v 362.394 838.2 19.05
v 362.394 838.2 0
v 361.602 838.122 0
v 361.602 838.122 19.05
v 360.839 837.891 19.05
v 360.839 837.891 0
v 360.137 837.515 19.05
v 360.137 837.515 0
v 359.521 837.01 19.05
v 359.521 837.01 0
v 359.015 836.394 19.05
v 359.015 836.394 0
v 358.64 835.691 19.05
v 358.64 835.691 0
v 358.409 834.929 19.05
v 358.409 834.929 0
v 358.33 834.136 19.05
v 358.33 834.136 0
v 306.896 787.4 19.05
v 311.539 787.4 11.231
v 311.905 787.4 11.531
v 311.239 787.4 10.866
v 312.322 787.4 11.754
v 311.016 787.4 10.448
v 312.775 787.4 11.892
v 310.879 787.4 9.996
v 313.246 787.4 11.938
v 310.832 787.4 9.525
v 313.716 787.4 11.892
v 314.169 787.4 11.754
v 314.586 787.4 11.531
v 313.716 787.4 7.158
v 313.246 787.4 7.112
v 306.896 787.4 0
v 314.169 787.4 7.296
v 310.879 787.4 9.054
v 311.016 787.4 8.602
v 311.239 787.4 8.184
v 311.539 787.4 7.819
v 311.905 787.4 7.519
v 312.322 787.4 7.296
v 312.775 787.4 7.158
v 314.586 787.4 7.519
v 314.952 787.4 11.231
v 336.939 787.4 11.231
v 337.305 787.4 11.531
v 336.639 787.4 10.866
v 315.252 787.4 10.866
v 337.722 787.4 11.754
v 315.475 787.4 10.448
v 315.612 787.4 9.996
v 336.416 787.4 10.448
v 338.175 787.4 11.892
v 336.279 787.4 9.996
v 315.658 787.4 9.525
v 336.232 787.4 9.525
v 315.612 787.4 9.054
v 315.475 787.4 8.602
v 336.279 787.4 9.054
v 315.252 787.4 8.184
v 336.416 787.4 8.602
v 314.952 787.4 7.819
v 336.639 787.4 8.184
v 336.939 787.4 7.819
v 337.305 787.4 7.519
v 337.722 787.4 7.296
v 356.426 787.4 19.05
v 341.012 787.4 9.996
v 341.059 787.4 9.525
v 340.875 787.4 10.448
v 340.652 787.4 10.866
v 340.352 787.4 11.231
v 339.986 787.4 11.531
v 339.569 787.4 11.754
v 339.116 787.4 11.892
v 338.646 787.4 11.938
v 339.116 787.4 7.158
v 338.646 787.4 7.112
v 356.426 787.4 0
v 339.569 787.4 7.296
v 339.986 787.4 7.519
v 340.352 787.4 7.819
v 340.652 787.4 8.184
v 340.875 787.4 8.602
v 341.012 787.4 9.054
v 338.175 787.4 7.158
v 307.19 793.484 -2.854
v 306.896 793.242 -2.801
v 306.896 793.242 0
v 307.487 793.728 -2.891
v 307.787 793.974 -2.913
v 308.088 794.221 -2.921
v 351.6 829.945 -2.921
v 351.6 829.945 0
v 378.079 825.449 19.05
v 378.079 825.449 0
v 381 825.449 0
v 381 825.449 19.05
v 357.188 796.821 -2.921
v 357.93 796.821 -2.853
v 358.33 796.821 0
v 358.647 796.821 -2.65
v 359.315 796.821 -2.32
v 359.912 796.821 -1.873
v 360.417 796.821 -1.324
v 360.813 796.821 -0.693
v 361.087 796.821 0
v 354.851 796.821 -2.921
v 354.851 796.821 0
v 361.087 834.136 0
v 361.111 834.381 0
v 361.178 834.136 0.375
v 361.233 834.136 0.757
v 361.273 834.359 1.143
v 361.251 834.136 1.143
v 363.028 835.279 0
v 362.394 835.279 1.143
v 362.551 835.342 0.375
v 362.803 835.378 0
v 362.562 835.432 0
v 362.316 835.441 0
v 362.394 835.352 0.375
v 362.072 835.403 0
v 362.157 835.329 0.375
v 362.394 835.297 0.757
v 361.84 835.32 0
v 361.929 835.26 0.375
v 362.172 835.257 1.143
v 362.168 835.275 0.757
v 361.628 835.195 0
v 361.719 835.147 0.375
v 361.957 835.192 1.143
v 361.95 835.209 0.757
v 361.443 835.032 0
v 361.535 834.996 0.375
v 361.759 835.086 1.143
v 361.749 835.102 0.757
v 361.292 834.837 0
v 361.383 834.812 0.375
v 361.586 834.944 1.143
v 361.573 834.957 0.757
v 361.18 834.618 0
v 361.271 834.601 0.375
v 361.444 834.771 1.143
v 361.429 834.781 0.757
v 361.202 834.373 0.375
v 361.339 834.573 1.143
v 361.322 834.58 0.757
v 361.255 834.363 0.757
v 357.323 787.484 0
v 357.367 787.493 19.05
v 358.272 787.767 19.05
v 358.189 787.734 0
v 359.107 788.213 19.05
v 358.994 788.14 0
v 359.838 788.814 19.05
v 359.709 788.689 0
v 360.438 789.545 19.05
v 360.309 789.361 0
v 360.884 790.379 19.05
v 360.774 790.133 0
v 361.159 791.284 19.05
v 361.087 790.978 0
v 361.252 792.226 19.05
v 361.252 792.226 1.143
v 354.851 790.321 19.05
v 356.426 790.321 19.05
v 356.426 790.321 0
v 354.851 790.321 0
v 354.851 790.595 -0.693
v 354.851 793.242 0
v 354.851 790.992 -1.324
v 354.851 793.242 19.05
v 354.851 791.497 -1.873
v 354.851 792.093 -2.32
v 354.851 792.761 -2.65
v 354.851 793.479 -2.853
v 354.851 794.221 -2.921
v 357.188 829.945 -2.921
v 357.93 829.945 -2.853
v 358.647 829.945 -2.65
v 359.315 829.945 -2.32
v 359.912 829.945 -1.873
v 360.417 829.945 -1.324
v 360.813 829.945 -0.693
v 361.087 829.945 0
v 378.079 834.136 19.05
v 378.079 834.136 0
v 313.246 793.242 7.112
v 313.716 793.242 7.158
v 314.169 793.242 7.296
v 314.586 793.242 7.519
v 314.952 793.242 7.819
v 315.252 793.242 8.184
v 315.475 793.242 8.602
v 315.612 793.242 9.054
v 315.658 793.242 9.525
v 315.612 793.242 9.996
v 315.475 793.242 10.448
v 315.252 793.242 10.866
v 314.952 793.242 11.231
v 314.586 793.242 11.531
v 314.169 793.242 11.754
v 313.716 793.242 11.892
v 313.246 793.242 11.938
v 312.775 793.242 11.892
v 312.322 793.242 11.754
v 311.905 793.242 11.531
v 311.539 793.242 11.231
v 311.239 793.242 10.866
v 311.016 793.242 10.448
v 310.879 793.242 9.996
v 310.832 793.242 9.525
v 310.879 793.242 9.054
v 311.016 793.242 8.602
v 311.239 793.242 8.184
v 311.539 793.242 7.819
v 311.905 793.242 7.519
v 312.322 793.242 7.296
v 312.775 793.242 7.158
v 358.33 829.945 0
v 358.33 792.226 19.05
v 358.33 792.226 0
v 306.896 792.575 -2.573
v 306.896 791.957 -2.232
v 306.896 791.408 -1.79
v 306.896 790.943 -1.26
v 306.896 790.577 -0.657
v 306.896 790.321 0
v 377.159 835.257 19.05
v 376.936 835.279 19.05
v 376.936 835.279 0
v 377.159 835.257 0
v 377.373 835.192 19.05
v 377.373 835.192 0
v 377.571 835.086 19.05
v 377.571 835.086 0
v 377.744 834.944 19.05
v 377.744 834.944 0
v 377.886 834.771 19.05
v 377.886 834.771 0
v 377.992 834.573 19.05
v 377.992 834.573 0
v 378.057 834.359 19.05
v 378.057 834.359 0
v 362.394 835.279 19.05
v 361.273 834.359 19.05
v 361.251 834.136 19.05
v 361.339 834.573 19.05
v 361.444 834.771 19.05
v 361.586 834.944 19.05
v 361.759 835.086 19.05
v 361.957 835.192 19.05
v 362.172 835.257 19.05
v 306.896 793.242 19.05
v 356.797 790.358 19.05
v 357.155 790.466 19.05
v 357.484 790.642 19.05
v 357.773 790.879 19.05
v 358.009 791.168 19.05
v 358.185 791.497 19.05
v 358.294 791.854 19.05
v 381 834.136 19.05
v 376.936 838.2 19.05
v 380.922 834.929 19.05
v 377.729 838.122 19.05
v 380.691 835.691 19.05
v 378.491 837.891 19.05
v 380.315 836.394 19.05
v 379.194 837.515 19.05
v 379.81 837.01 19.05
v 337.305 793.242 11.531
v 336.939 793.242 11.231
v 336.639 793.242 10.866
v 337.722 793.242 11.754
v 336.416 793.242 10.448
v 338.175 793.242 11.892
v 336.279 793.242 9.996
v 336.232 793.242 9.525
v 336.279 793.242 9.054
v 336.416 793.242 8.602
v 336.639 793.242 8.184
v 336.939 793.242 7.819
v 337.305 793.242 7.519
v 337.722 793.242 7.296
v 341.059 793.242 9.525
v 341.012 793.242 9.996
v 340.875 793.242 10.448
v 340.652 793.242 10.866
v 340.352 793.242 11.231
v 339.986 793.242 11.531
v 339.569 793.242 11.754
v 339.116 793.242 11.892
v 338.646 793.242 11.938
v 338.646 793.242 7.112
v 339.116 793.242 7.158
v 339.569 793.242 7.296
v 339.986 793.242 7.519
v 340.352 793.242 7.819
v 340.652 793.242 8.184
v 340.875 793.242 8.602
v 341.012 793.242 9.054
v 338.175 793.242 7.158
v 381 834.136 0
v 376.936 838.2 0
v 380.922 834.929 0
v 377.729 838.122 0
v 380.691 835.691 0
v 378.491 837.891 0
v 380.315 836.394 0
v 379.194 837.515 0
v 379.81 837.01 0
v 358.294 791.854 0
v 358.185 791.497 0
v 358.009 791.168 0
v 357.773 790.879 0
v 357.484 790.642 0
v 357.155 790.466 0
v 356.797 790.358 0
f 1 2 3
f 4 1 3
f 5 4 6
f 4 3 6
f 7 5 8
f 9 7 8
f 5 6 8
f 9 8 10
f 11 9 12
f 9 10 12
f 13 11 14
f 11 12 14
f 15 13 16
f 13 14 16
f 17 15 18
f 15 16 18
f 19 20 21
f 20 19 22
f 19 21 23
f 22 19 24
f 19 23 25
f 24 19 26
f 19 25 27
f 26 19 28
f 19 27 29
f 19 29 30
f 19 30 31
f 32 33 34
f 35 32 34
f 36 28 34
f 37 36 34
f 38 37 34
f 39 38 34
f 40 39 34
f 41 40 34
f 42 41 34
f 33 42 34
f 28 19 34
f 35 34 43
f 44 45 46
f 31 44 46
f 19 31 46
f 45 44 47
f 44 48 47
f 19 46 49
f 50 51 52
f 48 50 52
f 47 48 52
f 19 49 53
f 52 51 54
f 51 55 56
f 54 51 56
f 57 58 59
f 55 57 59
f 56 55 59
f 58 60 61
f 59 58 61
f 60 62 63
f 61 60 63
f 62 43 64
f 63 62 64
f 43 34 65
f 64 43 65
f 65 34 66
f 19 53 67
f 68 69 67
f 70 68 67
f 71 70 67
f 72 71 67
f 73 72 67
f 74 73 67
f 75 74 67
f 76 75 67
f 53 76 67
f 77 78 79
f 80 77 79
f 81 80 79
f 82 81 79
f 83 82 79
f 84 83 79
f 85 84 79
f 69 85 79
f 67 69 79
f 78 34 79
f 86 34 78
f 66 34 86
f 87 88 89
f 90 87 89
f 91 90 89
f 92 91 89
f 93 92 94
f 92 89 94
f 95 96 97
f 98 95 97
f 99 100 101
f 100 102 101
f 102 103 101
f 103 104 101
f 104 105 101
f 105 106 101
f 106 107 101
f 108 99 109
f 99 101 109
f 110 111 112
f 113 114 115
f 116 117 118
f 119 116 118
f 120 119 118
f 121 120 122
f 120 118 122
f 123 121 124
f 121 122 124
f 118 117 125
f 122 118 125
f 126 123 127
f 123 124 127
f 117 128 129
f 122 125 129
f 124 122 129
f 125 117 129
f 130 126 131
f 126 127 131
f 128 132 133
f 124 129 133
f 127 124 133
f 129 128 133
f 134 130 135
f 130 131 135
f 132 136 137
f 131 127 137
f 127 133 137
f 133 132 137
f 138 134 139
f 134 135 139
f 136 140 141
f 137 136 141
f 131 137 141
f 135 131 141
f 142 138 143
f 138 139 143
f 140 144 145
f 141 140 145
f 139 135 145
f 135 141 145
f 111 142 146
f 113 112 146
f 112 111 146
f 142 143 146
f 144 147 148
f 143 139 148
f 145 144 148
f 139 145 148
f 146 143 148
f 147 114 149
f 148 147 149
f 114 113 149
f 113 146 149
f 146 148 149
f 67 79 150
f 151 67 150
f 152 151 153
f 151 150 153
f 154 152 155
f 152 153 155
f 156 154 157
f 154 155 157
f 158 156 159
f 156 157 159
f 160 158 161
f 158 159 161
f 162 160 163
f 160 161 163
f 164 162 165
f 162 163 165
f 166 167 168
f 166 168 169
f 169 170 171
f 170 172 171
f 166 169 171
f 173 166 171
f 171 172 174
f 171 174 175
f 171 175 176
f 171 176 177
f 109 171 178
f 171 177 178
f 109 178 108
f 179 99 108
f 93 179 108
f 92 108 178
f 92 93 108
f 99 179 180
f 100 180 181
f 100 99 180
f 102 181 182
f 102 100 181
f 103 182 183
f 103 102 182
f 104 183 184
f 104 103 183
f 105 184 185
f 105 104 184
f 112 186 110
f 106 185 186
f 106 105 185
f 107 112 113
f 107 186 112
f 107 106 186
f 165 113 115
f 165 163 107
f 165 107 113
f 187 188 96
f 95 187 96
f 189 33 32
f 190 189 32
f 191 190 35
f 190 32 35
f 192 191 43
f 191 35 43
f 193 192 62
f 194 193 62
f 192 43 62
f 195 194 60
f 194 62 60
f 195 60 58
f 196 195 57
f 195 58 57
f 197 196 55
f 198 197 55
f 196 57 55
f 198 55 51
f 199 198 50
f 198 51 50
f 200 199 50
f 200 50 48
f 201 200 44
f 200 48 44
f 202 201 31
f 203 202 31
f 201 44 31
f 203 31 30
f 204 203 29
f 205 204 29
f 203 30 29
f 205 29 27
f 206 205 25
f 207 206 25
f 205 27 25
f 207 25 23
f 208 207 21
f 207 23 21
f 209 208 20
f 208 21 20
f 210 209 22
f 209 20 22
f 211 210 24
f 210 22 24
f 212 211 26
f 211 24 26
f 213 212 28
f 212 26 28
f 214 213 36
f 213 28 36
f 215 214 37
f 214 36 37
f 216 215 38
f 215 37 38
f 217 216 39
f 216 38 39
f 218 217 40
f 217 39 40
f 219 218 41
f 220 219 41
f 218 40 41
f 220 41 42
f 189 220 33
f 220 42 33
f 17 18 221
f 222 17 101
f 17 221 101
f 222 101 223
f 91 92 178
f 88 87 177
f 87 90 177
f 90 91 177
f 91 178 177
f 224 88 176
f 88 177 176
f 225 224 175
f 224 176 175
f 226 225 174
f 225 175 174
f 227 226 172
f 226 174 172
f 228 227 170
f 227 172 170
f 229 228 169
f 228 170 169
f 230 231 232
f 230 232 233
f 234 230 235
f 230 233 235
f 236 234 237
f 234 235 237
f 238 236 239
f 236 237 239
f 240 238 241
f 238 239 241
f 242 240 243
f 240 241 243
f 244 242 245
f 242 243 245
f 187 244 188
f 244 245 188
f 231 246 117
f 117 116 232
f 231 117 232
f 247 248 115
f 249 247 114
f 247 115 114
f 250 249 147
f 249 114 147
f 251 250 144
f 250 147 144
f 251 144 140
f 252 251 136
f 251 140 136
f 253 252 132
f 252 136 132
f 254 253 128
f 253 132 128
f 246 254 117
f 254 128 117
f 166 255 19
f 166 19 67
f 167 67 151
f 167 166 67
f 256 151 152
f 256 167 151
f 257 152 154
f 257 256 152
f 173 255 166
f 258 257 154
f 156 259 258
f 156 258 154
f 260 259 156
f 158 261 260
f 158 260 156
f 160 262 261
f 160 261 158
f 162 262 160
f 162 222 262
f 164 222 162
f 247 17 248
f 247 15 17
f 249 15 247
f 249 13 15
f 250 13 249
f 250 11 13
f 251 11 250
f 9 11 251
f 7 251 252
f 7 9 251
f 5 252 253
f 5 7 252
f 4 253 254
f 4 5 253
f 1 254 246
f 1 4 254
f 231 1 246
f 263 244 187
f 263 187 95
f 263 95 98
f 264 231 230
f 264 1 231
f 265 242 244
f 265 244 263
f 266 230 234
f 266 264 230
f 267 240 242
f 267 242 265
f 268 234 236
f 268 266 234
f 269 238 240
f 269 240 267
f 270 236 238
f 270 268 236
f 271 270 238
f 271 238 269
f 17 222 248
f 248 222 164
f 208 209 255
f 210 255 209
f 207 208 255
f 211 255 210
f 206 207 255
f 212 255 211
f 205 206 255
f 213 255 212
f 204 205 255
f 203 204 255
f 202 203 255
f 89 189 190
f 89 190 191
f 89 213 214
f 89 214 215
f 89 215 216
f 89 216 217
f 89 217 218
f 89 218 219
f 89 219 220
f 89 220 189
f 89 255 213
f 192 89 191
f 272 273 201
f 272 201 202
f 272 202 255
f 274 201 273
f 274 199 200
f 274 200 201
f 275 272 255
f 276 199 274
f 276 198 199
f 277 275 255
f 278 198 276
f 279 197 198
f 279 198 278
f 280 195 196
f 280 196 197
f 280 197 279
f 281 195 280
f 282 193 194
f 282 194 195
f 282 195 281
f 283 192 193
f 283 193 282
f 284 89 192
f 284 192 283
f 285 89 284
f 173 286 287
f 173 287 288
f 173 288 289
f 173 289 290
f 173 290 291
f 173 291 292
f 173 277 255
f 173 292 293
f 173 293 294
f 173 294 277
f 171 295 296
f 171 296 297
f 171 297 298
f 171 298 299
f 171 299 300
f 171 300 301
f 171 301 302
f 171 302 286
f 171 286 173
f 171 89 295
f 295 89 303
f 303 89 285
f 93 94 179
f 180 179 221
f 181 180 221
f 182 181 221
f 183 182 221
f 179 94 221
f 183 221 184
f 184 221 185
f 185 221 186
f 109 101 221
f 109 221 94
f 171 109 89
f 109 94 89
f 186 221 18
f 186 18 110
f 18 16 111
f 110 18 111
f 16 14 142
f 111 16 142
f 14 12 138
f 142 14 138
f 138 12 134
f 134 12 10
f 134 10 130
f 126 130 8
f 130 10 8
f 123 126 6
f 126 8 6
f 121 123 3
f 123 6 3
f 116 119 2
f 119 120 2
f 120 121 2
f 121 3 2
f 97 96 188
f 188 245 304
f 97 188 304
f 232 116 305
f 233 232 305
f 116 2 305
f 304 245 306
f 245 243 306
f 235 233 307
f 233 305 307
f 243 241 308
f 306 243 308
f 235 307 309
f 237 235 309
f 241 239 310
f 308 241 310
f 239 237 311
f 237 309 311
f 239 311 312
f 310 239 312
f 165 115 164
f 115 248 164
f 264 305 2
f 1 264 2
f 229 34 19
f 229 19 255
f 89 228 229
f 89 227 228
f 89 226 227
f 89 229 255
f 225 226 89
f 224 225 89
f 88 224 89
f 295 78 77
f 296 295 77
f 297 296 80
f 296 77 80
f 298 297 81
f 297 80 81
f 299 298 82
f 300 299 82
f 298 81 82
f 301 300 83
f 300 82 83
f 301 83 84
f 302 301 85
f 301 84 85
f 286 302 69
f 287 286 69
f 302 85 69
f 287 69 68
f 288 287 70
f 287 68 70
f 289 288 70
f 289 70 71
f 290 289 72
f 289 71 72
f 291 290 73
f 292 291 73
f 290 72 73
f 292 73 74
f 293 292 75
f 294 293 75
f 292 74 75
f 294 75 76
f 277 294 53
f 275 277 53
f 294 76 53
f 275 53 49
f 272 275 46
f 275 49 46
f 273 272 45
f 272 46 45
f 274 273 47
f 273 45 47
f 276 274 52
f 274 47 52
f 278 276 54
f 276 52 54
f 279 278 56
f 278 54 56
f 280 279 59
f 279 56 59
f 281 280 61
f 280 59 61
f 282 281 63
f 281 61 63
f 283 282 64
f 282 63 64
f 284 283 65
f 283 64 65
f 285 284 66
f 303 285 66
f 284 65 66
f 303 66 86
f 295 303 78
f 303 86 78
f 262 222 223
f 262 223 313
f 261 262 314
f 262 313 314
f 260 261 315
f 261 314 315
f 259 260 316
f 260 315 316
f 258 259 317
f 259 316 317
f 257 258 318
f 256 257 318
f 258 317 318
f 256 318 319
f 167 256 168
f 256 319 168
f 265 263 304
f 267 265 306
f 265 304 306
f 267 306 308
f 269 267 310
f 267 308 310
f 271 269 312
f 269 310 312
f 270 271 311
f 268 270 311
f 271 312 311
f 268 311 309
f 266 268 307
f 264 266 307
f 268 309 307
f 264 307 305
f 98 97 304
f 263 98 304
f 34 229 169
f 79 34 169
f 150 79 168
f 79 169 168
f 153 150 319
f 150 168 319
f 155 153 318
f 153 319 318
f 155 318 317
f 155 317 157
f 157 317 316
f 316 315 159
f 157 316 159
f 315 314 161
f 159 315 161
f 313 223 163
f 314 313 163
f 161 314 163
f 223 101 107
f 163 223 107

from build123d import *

# Parameters (mm, degrees)
EXTRUDE1_DEPTH     = 19.05
EXTRUDE4_DEPTH     = 2.921
SKETCH5_W          = 47.9552
SKETCH5_H          = 2.921
EXTRUDE5_DEPTH     = 19.05
FILLET1_R          = 4.064
FILLET2_START      = 790
FILLET2_2_DEPTH    = 44.1360001
SKETCH6_R          = 2.413
CUT_EXTRUDE1_DEPTH = 5.842


with BuildPart() as part:
    # Sketch2 → Extrude1 (new body)
    with BuildSketch(Plane.XY):
        with BuildLine():
            Line((356.4255, 790.321), (306.8955, 790.321))
            Line((306.8955, 790.321), (306.8955, 787.4))
            Line((306.8955, 787.4), (356.4255, 787.4))
            ThreePointArc((356.4255, 787.4), (359.837997326, 788.813502674), (361.2515, 792.226))
            Line((361.2515, 792.226), (361.2515, 834.136))
            ThreePointArc((361.2515, 834.136), (361.586276949, 834.944223051), (362.3945, 835.279))
            Line((362.3945, 835.279), (376.936, 835.279))
            ThreePointArc((376.936, 835.279), (377.744223051, 834.944223051), (378.079, 834.136))
            Line((378.079, 834.136), (378.079, 825.4492))
            Line((378.079, 825.4492), (381, 825.4492))
            Line((381, 825.4492), (381, 834.136))
            ThreePointArc((381, 834.136), (379.809681959, 837.009681959), (376.936, 838.2))
            Line((376.936, 838.2), (362.3945, 838.2))
            ThreePointArc((362.3945, 838.2), (359.520818041, 837.009681959), (358.3305, 834.136))
            Line((358.3305, 834.136), (358.3305, 792.226))
            ThreePointArc((358.3305, 792.226), (357.772538418, 790.878961582), (356.4255, 790.321))
        make_face()
    extrude(amount=EXTRUDE1_DEPTH)



with BuildPart() as body_2:
    # Sketch3 → Extrude4 (new body)
    with BuildSketch(Plane.XY):
        Polygon((306.8955, 793.242), (351.5995, 829.945), (361.2515, 829.945), (361.2515, 796.82051965), (354.8507, 796.82051965), (354.8507, 790.321), (306.8955, 790.321), align=None)
    extrude(amount=-EXTRUDE4_DEPTH)


with BuildPart() as part_1:
    add(part.part)

    add(body_2.part)  # Extrude5 merges body 2
    # Sketch5 → Extrude5 (add)
    with BuildSketch(Plane.XY):
        with Locations((330.8731, 791.7815)):
            Rectangle(SKETCH5_W, SKETCH5_H)
    extrude(amount=EXTRUDE5_DEPTH)

    # Fillet1
    # the kernel refuses this fillet: 4.064 mm, written as the material it takes off along each edge
    with BuildSketch(Plane(origin=(364.600586858, 790.321, -2.921), x_dir=(0, 0, 1), z_dir=(-1, 0, 0))) as fillet1_piece_1:
        with BuildLine():
            CenterArc((4.064, 3.899954743), FILLET1_R, 180, 73.665177219)
            Line((0, 3.899954743), (-0.08128, 3.899954743))
            Line((-0.08128, 3.899954743), (-0.08128, 0))
            Line((-0.08128, 0), (0, -0.08128))
            ThreePointArc((0, -0.08128), (1.4605, -0.08128), (2.89814, -0.077999095))
            Line((2.89814, -0.077999095), (2.921, 0))
        make_face()
    extrude(amount=67.454973717, mode=Mode.SUBTRACT)

    # Fillet2: read off the stored shape, not the designer's step
    # Fillet2 outline → Fillet2 (revolve, cut)
    with BuildSketch(Plane(origin=(362.3945, 834.136, 0), x_dir=(1, 0, 0), z_dir=(0, -1, 0))):
        with BuildLine():
            Line((1.143, 0), (1.307045257, 0))
            ThreePointArc((1.307045257, 0), (1.184220359, 0.565643991), (1.143, 1.143))
            Line((1.143, 1.143), (1.143, 0))
        make_face()
    revolve(axis=Axis((362.3945, 834.136, 0), (0, 0, 1)), mode=Mode.SUBTRACT)

    # Fillet2 2 outline → Fillet2 2 (cut)
    with BuildSketch(Plane(origin=(0, 0, 0), x_dir=(1, 0, 0), z_dir=(0, 1, 0)).offset(FILLET2_START)):
        with BuildLine():
            Line((361.2515, 2.921), (357.1875, 2.921))
            ThreePointArc((357.1875, 2.921), (360.061181959, 1.730681959), (361.2515, -1.143))
            Line((361.2515, -1.143), (361.2515, 2.921))
        make_face()
    extrude(amount=FILLET2_2_DEPTH, mode=Mode.SUBTRACT)

    # Sketch6 → Cut-Extrude1 (cut)
    with BuildSketch(Plane.XZ.offset(-787.4)):
        with Locations(Location((313.2455, 9.525, 0), (0, 0, 270))):
            Circle(SKETCH6_R)
        with Locations(Location((338.6455, 9.525, 0), (0, 0, 270))):
            Circle(SKETCH6_R)
    extrude(amount=-CUT_EXTRUDE1_DEPTH, mode=Mode.SUBTRACT)


solid = part_1.part
